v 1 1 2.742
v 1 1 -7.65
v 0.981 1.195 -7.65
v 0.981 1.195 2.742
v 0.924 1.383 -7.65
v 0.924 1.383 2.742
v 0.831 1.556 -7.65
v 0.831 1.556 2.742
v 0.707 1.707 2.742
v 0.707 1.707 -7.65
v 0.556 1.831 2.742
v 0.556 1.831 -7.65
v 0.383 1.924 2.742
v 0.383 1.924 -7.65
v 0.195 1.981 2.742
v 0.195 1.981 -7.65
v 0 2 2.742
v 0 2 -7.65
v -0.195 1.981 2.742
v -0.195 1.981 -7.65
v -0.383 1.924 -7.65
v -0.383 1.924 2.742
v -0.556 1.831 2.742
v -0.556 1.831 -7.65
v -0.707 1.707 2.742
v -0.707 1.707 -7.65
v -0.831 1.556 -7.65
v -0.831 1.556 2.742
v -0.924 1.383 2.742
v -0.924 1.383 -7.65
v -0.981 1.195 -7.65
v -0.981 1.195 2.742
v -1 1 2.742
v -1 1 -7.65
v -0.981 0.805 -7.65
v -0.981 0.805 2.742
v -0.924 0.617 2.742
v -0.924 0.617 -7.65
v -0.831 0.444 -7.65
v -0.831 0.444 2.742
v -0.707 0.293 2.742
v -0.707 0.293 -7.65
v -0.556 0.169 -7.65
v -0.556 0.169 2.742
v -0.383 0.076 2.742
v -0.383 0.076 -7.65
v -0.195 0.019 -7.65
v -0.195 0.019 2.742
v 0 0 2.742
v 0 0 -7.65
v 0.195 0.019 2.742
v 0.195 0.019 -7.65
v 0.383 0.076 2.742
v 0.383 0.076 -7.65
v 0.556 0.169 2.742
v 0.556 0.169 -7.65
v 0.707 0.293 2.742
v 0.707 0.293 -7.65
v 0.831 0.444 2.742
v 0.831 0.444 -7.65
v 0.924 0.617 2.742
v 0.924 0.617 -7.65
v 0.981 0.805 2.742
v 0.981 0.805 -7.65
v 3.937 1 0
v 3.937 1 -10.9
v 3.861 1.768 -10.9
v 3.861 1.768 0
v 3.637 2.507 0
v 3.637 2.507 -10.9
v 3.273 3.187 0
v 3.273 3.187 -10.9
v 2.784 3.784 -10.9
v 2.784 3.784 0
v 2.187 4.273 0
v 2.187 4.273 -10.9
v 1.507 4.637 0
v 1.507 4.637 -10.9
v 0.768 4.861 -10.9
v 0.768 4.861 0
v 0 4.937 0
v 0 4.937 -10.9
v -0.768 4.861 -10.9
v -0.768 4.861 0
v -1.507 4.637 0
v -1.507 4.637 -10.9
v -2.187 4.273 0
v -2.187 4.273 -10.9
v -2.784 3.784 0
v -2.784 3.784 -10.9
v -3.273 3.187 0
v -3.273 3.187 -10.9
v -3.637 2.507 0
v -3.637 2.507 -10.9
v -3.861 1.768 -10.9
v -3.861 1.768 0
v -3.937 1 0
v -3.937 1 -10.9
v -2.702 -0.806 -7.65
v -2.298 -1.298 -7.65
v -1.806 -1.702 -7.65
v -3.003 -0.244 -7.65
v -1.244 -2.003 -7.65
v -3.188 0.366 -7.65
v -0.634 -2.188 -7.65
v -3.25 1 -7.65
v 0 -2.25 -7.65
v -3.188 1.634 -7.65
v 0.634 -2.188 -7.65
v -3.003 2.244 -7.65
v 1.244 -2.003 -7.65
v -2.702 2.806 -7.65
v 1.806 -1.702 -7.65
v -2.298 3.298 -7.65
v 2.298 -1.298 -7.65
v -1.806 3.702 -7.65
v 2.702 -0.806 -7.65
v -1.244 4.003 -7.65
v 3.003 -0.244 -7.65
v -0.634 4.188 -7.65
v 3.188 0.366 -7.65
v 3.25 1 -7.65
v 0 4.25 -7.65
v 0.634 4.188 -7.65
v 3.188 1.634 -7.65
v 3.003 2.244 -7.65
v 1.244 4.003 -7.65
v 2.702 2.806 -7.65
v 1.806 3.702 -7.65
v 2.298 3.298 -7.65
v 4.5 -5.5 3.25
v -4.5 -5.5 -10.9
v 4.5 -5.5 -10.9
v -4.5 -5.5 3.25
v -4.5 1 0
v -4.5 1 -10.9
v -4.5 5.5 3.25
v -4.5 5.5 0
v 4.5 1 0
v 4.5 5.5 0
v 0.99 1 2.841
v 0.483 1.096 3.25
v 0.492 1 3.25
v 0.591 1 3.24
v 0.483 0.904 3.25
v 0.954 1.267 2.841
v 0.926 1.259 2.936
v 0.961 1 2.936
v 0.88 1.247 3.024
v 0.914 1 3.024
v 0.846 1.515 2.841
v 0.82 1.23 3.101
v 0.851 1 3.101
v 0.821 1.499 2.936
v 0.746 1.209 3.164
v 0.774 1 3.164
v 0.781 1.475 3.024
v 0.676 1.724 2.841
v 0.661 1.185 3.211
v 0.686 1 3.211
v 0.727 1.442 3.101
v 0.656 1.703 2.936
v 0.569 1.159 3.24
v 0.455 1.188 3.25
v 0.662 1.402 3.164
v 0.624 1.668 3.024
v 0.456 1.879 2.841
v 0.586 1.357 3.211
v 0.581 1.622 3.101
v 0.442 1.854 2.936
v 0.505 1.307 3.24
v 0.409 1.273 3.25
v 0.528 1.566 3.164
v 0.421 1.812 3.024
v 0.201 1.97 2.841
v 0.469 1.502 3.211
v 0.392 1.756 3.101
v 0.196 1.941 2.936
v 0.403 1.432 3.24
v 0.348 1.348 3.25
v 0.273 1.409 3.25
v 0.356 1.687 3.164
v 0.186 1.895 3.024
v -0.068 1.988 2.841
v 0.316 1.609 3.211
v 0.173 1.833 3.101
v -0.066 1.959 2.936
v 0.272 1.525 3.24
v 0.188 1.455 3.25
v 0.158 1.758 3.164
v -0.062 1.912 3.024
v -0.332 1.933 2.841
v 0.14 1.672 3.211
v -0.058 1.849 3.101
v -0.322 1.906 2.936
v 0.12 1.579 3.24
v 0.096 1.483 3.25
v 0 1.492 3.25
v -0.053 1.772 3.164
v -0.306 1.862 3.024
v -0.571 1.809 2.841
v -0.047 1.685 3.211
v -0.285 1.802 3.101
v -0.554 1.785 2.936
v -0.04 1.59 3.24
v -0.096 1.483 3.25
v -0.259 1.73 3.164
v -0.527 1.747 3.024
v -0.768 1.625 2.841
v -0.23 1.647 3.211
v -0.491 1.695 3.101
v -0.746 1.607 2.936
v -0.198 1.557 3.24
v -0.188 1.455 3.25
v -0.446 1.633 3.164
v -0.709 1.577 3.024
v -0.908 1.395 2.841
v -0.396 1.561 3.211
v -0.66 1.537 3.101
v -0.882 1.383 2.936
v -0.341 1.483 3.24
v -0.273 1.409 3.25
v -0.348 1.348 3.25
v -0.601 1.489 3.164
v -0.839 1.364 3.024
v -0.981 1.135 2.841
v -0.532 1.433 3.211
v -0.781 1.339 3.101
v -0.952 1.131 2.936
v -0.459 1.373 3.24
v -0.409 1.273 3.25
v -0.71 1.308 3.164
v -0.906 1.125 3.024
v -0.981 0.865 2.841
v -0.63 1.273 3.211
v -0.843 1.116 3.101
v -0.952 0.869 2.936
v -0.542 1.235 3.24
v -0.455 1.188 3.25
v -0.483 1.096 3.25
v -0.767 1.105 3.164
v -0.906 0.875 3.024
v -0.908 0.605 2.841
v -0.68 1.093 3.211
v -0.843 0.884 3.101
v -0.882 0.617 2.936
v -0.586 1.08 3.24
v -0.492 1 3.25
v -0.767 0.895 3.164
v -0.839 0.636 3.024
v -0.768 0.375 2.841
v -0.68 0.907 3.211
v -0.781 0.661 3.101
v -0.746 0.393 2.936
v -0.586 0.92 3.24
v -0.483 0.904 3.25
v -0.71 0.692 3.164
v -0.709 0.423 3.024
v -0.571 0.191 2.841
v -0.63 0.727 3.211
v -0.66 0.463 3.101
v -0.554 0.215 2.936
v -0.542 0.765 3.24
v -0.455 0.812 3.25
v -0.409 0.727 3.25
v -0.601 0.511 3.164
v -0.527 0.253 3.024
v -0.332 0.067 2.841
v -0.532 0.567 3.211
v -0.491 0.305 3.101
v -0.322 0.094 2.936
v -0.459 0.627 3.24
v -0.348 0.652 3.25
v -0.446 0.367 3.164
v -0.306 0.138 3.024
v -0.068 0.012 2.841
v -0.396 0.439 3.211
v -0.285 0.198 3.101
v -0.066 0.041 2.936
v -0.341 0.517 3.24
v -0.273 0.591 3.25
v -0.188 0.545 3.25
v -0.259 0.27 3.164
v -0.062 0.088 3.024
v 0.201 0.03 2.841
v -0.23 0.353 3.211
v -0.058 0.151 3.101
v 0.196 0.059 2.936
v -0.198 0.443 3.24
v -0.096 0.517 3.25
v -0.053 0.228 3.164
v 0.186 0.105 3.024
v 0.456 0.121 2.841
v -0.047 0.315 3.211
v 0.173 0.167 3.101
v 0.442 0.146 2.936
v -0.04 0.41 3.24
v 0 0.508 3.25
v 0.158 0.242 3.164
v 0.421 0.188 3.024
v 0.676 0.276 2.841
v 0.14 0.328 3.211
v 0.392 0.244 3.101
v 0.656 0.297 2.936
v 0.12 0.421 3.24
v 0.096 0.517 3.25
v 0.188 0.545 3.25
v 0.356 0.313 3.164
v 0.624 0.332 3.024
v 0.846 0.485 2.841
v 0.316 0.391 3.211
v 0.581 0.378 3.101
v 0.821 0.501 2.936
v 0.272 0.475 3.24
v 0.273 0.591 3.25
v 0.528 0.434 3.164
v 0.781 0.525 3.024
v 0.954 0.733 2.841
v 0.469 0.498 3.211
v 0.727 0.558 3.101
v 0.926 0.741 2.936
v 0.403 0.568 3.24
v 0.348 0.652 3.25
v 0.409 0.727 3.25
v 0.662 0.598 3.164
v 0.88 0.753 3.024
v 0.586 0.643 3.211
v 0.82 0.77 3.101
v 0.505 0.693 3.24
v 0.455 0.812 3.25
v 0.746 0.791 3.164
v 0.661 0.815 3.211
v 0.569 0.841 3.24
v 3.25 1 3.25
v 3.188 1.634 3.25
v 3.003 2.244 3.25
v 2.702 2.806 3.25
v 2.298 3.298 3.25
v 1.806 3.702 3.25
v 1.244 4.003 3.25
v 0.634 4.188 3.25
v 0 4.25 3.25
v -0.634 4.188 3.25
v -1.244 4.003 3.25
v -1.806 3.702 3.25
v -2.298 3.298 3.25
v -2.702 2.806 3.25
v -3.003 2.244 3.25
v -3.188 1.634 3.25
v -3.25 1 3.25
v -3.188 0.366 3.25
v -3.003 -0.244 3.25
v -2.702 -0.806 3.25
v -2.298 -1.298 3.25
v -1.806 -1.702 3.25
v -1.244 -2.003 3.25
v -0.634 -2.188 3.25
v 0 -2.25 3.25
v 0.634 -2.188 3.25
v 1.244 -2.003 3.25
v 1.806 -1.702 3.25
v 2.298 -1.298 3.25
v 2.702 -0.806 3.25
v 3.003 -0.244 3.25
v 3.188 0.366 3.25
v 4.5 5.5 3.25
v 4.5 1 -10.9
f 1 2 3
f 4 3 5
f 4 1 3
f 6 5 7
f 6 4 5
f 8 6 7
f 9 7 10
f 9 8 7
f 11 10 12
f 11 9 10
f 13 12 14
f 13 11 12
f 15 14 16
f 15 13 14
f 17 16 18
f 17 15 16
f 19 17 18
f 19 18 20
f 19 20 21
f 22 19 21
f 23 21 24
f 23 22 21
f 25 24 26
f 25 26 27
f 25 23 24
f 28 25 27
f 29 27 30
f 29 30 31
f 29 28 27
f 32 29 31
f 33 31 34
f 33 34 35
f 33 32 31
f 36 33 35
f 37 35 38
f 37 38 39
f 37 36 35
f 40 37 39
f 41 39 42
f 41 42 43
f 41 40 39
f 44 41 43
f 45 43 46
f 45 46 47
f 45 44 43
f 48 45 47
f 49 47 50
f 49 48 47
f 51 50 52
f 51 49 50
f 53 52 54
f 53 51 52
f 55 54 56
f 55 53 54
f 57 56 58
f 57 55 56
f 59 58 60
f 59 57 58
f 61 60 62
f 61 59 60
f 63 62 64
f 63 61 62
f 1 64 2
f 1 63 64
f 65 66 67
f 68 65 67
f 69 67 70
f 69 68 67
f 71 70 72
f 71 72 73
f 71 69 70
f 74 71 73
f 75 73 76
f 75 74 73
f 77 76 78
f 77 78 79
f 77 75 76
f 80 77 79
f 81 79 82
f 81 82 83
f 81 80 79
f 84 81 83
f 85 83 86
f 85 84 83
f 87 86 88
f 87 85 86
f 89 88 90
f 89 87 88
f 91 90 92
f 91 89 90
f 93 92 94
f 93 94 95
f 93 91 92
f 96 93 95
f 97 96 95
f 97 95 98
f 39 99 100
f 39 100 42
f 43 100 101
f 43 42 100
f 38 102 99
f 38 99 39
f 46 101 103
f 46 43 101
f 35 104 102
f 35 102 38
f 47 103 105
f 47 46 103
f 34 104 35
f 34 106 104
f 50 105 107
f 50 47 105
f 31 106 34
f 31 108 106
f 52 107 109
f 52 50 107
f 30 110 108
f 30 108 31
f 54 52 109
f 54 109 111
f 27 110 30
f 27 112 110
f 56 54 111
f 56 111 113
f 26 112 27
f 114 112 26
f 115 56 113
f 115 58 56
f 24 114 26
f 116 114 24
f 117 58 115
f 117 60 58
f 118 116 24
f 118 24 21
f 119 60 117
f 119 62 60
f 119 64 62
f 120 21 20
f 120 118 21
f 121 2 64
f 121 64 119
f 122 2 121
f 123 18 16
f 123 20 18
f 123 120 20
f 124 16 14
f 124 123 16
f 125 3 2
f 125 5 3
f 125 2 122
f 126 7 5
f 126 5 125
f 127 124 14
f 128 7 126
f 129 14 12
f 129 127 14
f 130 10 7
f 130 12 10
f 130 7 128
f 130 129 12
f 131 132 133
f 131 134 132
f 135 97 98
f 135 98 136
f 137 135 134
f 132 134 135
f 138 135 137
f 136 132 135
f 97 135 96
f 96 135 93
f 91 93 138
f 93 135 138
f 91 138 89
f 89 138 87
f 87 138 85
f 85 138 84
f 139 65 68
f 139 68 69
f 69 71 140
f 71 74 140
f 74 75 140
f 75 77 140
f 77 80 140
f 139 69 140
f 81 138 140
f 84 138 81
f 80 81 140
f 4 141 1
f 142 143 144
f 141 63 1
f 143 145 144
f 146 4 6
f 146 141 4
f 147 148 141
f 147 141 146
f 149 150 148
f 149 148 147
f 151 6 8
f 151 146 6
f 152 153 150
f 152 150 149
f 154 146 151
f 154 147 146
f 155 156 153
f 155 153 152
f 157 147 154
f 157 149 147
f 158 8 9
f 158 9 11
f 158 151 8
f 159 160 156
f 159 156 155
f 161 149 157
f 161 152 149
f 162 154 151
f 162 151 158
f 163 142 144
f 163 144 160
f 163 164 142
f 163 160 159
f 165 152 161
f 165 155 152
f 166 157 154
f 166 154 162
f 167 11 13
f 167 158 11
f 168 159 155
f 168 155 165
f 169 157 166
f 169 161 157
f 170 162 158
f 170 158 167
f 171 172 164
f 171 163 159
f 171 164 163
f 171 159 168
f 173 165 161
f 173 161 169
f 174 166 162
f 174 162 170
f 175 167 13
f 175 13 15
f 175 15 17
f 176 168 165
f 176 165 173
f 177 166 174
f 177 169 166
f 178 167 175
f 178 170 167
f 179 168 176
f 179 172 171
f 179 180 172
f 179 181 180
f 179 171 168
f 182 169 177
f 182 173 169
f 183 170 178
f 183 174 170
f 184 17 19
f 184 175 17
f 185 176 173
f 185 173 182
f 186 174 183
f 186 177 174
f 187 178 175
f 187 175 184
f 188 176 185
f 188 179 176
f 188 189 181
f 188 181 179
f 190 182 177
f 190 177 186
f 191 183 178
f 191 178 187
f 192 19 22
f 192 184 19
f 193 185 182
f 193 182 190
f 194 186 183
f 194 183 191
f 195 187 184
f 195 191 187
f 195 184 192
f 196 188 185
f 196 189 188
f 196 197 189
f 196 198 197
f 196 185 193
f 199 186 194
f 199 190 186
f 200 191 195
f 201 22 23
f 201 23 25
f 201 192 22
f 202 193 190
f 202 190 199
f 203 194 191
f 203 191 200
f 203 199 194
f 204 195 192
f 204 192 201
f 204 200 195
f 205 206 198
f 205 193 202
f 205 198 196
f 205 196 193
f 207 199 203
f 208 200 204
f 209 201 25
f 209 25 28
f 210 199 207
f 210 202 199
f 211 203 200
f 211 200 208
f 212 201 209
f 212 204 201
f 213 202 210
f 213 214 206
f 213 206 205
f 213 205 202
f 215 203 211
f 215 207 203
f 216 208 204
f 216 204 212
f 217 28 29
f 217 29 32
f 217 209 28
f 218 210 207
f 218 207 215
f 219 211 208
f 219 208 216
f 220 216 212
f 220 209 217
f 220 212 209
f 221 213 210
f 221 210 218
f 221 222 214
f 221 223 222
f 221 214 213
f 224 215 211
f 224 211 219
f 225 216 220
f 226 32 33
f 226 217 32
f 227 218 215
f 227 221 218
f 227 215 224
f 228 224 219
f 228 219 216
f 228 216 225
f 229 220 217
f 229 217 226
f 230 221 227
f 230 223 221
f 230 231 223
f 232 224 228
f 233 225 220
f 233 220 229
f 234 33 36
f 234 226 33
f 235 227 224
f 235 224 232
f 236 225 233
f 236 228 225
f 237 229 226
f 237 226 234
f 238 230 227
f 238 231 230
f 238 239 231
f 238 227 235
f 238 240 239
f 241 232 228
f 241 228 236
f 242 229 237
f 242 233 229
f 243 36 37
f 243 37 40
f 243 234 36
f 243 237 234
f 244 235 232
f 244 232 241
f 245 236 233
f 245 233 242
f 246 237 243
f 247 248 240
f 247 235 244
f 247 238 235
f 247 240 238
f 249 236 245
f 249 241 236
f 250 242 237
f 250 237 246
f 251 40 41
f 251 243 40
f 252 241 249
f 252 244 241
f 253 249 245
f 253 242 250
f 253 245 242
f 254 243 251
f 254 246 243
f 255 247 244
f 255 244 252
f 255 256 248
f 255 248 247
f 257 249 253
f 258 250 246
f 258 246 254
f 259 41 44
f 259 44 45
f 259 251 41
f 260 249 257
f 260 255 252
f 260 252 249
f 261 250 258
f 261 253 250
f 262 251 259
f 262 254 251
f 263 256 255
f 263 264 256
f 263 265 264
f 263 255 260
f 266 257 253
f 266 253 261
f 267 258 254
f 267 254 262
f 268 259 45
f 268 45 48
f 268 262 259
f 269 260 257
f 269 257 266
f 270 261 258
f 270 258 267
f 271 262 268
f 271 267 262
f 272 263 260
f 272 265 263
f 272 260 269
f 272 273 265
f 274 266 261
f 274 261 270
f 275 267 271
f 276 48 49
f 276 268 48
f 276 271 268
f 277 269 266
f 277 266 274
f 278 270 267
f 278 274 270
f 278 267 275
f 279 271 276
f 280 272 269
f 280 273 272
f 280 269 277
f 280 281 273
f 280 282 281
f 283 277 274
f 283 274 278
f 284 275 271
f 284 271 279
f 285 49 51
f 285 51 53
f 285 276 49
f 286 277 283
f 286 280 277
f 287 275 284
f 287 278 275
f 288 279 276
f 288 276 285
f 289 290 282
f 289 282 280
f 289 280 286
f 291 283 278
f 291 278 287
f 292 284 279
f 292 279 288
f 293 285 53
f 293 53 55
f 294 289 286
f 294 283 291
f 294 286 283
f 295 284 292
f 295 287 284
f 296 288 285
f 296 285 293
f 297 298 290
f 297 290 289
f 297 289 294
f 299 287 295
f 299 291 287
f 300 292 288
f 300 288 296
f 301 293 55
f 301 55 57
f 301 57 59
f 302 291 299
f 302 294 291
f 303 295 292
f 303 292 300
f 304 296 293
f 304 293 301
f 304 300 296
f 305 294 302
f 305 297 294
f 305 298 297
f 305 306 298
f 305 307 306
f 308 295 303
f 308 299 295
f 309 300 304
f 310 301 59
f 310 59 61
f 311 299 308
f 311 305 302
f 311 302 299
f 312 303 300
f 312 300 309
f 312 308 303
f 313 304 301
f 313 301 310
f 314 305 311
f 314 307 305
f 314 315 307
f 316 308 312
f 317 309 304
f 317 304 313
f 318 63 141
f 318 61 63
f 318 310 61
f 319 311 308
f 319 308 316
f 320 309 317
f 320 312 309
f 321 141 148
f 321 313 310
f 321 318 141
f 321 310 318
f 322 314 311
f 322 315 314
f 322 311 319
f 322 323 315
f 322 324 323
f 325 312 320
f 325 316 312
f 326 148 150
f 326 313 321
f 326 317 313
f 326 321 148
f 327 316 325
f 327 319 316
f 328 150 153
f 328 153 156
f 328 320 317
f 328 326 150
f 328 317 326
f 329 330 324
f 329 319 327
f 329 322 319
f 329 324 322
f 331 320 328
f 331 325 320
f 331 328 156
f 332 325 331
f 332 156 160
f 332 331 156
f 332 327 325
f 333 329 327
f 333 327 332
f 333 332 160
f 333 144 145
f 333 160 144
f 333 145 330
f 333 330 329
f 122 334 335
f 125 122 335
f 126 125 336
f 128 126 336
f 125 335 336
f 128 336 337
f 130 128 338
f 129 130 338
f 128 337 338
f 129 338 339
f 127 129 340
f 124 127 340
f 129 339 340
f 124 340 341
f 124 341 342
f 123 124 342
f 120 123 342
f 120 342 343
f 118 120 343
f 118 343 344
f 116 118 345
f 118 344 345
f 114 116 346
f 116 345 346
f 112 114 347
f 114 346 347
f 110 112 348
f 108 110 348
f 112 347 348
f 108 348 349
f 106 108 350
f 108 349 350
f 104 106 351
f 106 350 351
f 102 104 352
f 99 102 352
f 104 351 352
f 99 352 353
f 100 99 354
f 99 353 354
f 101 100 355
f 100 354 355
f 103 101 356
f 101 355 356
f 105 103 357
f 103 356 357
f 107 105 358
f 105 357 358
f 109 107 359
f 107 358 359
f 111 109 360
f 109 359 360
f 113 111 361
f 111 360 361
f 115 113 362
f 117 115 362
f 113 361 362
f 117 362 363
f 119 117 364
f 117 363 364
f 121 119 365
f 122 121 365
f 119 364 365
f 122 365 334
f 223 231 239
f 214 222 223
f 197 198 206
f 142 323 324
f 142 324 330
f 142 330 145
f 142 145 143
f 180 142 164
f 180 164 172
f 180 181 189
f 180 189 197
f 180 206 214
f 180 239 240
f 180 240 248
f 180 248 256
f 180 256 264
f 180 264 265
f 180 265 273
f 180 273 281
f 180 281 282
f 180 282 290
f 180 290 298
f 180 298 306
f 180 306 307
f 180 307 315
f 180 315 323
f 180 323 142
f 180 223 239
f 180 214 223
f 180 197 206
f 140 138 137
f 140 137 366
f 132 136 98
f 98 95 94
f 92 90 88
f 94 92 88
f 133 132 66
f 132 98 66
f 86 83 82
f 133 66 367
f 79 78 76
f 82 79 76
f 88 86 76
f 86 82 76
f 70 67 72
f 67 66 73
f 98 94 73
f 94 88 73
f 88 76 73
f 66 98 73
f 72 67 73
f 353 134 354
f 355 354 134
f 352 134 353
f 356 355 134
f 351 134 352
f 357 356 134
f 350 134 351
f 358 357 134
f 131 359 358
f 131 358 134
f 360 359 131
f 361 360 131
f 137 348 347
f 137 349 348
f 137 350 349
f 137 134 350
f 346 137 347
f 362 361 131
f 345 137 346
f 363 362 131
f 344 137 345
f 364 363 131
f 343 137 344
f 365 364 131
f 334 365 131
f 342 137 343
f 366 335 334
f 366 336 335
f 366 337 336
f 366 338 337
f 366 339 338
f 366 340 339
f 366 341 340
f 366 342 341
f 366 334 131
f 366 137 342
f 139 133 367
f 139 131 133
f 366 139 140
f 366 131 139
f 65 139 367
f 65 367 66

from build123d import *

# Parameters (mm, degrees)
SKETCH2_W           = 9
SKETCH2_H           = 11
BOSS_EXTRUDE1_DEPTH = 3.25
BOSS_EXTRUDE2_DEPTH = 10.9
SKETCH4_R           = 3.25
SKETCH4_R_2         = 1
CUT_EXTRUDE1_DEPTH  = 10.9
FILLET1_R           = 0.508


with BuildPart() as part:
    # Sketch2 → Boss-Extrude1 (new body)
    with BuildSketch(Plane.XY):
        Rectangle(SKETCH2_W, SKETCH2_H)
    extrude(amount=BOSS_EXTRUDE1_DEPTH)

    # Sketch3 → Boss-Extrude2 (add)
    with BuildSketch(Plane(origin=(0, 0, 0), x_dir=(-1, 0, 0), z_dir=(0, 0, -1))):
        with BuildLine():
            Line((-4.5, 1), (-3.937, 1))
            ThreePointArc((-3.937, 1), (0, 4.937), (3.937, 1))
            Line((3.937, 1), (4.5, 1))
            Line((4.5, 1), (4.5, -5.5))
            Line((4.5, -5.5), (-4.5, -5.5))
            Line((-4.5, -5.5), (-4.5, 1))
        make_face()
    extrude(amount=BOSS_EXTRUDE2_DEPTH)

    # Sketch4 → Cut-Extrude1 (cut)
    with BuildSketch(Plane.XY.offset(3.25)):
        with Locations((0, 1)):
            Circle(SKETCH4_R)
        with Locations((0, 1)):
            Circle(SKETCH4_R_2, mode=Mode.SUBTRACT)
    extrude(amount=-CUT_EXTRUDE1_DEPTH, mode=Mode.SUBTRACT)

    # Fillet1
    fillet1_edges = [part.edges().sort_by_distance(p)[0] for p in [
        (-1, 1, 3.25),
    ]]
    fillet(fillet1_edges, radius=FILLET1_R)


solid = part.part
